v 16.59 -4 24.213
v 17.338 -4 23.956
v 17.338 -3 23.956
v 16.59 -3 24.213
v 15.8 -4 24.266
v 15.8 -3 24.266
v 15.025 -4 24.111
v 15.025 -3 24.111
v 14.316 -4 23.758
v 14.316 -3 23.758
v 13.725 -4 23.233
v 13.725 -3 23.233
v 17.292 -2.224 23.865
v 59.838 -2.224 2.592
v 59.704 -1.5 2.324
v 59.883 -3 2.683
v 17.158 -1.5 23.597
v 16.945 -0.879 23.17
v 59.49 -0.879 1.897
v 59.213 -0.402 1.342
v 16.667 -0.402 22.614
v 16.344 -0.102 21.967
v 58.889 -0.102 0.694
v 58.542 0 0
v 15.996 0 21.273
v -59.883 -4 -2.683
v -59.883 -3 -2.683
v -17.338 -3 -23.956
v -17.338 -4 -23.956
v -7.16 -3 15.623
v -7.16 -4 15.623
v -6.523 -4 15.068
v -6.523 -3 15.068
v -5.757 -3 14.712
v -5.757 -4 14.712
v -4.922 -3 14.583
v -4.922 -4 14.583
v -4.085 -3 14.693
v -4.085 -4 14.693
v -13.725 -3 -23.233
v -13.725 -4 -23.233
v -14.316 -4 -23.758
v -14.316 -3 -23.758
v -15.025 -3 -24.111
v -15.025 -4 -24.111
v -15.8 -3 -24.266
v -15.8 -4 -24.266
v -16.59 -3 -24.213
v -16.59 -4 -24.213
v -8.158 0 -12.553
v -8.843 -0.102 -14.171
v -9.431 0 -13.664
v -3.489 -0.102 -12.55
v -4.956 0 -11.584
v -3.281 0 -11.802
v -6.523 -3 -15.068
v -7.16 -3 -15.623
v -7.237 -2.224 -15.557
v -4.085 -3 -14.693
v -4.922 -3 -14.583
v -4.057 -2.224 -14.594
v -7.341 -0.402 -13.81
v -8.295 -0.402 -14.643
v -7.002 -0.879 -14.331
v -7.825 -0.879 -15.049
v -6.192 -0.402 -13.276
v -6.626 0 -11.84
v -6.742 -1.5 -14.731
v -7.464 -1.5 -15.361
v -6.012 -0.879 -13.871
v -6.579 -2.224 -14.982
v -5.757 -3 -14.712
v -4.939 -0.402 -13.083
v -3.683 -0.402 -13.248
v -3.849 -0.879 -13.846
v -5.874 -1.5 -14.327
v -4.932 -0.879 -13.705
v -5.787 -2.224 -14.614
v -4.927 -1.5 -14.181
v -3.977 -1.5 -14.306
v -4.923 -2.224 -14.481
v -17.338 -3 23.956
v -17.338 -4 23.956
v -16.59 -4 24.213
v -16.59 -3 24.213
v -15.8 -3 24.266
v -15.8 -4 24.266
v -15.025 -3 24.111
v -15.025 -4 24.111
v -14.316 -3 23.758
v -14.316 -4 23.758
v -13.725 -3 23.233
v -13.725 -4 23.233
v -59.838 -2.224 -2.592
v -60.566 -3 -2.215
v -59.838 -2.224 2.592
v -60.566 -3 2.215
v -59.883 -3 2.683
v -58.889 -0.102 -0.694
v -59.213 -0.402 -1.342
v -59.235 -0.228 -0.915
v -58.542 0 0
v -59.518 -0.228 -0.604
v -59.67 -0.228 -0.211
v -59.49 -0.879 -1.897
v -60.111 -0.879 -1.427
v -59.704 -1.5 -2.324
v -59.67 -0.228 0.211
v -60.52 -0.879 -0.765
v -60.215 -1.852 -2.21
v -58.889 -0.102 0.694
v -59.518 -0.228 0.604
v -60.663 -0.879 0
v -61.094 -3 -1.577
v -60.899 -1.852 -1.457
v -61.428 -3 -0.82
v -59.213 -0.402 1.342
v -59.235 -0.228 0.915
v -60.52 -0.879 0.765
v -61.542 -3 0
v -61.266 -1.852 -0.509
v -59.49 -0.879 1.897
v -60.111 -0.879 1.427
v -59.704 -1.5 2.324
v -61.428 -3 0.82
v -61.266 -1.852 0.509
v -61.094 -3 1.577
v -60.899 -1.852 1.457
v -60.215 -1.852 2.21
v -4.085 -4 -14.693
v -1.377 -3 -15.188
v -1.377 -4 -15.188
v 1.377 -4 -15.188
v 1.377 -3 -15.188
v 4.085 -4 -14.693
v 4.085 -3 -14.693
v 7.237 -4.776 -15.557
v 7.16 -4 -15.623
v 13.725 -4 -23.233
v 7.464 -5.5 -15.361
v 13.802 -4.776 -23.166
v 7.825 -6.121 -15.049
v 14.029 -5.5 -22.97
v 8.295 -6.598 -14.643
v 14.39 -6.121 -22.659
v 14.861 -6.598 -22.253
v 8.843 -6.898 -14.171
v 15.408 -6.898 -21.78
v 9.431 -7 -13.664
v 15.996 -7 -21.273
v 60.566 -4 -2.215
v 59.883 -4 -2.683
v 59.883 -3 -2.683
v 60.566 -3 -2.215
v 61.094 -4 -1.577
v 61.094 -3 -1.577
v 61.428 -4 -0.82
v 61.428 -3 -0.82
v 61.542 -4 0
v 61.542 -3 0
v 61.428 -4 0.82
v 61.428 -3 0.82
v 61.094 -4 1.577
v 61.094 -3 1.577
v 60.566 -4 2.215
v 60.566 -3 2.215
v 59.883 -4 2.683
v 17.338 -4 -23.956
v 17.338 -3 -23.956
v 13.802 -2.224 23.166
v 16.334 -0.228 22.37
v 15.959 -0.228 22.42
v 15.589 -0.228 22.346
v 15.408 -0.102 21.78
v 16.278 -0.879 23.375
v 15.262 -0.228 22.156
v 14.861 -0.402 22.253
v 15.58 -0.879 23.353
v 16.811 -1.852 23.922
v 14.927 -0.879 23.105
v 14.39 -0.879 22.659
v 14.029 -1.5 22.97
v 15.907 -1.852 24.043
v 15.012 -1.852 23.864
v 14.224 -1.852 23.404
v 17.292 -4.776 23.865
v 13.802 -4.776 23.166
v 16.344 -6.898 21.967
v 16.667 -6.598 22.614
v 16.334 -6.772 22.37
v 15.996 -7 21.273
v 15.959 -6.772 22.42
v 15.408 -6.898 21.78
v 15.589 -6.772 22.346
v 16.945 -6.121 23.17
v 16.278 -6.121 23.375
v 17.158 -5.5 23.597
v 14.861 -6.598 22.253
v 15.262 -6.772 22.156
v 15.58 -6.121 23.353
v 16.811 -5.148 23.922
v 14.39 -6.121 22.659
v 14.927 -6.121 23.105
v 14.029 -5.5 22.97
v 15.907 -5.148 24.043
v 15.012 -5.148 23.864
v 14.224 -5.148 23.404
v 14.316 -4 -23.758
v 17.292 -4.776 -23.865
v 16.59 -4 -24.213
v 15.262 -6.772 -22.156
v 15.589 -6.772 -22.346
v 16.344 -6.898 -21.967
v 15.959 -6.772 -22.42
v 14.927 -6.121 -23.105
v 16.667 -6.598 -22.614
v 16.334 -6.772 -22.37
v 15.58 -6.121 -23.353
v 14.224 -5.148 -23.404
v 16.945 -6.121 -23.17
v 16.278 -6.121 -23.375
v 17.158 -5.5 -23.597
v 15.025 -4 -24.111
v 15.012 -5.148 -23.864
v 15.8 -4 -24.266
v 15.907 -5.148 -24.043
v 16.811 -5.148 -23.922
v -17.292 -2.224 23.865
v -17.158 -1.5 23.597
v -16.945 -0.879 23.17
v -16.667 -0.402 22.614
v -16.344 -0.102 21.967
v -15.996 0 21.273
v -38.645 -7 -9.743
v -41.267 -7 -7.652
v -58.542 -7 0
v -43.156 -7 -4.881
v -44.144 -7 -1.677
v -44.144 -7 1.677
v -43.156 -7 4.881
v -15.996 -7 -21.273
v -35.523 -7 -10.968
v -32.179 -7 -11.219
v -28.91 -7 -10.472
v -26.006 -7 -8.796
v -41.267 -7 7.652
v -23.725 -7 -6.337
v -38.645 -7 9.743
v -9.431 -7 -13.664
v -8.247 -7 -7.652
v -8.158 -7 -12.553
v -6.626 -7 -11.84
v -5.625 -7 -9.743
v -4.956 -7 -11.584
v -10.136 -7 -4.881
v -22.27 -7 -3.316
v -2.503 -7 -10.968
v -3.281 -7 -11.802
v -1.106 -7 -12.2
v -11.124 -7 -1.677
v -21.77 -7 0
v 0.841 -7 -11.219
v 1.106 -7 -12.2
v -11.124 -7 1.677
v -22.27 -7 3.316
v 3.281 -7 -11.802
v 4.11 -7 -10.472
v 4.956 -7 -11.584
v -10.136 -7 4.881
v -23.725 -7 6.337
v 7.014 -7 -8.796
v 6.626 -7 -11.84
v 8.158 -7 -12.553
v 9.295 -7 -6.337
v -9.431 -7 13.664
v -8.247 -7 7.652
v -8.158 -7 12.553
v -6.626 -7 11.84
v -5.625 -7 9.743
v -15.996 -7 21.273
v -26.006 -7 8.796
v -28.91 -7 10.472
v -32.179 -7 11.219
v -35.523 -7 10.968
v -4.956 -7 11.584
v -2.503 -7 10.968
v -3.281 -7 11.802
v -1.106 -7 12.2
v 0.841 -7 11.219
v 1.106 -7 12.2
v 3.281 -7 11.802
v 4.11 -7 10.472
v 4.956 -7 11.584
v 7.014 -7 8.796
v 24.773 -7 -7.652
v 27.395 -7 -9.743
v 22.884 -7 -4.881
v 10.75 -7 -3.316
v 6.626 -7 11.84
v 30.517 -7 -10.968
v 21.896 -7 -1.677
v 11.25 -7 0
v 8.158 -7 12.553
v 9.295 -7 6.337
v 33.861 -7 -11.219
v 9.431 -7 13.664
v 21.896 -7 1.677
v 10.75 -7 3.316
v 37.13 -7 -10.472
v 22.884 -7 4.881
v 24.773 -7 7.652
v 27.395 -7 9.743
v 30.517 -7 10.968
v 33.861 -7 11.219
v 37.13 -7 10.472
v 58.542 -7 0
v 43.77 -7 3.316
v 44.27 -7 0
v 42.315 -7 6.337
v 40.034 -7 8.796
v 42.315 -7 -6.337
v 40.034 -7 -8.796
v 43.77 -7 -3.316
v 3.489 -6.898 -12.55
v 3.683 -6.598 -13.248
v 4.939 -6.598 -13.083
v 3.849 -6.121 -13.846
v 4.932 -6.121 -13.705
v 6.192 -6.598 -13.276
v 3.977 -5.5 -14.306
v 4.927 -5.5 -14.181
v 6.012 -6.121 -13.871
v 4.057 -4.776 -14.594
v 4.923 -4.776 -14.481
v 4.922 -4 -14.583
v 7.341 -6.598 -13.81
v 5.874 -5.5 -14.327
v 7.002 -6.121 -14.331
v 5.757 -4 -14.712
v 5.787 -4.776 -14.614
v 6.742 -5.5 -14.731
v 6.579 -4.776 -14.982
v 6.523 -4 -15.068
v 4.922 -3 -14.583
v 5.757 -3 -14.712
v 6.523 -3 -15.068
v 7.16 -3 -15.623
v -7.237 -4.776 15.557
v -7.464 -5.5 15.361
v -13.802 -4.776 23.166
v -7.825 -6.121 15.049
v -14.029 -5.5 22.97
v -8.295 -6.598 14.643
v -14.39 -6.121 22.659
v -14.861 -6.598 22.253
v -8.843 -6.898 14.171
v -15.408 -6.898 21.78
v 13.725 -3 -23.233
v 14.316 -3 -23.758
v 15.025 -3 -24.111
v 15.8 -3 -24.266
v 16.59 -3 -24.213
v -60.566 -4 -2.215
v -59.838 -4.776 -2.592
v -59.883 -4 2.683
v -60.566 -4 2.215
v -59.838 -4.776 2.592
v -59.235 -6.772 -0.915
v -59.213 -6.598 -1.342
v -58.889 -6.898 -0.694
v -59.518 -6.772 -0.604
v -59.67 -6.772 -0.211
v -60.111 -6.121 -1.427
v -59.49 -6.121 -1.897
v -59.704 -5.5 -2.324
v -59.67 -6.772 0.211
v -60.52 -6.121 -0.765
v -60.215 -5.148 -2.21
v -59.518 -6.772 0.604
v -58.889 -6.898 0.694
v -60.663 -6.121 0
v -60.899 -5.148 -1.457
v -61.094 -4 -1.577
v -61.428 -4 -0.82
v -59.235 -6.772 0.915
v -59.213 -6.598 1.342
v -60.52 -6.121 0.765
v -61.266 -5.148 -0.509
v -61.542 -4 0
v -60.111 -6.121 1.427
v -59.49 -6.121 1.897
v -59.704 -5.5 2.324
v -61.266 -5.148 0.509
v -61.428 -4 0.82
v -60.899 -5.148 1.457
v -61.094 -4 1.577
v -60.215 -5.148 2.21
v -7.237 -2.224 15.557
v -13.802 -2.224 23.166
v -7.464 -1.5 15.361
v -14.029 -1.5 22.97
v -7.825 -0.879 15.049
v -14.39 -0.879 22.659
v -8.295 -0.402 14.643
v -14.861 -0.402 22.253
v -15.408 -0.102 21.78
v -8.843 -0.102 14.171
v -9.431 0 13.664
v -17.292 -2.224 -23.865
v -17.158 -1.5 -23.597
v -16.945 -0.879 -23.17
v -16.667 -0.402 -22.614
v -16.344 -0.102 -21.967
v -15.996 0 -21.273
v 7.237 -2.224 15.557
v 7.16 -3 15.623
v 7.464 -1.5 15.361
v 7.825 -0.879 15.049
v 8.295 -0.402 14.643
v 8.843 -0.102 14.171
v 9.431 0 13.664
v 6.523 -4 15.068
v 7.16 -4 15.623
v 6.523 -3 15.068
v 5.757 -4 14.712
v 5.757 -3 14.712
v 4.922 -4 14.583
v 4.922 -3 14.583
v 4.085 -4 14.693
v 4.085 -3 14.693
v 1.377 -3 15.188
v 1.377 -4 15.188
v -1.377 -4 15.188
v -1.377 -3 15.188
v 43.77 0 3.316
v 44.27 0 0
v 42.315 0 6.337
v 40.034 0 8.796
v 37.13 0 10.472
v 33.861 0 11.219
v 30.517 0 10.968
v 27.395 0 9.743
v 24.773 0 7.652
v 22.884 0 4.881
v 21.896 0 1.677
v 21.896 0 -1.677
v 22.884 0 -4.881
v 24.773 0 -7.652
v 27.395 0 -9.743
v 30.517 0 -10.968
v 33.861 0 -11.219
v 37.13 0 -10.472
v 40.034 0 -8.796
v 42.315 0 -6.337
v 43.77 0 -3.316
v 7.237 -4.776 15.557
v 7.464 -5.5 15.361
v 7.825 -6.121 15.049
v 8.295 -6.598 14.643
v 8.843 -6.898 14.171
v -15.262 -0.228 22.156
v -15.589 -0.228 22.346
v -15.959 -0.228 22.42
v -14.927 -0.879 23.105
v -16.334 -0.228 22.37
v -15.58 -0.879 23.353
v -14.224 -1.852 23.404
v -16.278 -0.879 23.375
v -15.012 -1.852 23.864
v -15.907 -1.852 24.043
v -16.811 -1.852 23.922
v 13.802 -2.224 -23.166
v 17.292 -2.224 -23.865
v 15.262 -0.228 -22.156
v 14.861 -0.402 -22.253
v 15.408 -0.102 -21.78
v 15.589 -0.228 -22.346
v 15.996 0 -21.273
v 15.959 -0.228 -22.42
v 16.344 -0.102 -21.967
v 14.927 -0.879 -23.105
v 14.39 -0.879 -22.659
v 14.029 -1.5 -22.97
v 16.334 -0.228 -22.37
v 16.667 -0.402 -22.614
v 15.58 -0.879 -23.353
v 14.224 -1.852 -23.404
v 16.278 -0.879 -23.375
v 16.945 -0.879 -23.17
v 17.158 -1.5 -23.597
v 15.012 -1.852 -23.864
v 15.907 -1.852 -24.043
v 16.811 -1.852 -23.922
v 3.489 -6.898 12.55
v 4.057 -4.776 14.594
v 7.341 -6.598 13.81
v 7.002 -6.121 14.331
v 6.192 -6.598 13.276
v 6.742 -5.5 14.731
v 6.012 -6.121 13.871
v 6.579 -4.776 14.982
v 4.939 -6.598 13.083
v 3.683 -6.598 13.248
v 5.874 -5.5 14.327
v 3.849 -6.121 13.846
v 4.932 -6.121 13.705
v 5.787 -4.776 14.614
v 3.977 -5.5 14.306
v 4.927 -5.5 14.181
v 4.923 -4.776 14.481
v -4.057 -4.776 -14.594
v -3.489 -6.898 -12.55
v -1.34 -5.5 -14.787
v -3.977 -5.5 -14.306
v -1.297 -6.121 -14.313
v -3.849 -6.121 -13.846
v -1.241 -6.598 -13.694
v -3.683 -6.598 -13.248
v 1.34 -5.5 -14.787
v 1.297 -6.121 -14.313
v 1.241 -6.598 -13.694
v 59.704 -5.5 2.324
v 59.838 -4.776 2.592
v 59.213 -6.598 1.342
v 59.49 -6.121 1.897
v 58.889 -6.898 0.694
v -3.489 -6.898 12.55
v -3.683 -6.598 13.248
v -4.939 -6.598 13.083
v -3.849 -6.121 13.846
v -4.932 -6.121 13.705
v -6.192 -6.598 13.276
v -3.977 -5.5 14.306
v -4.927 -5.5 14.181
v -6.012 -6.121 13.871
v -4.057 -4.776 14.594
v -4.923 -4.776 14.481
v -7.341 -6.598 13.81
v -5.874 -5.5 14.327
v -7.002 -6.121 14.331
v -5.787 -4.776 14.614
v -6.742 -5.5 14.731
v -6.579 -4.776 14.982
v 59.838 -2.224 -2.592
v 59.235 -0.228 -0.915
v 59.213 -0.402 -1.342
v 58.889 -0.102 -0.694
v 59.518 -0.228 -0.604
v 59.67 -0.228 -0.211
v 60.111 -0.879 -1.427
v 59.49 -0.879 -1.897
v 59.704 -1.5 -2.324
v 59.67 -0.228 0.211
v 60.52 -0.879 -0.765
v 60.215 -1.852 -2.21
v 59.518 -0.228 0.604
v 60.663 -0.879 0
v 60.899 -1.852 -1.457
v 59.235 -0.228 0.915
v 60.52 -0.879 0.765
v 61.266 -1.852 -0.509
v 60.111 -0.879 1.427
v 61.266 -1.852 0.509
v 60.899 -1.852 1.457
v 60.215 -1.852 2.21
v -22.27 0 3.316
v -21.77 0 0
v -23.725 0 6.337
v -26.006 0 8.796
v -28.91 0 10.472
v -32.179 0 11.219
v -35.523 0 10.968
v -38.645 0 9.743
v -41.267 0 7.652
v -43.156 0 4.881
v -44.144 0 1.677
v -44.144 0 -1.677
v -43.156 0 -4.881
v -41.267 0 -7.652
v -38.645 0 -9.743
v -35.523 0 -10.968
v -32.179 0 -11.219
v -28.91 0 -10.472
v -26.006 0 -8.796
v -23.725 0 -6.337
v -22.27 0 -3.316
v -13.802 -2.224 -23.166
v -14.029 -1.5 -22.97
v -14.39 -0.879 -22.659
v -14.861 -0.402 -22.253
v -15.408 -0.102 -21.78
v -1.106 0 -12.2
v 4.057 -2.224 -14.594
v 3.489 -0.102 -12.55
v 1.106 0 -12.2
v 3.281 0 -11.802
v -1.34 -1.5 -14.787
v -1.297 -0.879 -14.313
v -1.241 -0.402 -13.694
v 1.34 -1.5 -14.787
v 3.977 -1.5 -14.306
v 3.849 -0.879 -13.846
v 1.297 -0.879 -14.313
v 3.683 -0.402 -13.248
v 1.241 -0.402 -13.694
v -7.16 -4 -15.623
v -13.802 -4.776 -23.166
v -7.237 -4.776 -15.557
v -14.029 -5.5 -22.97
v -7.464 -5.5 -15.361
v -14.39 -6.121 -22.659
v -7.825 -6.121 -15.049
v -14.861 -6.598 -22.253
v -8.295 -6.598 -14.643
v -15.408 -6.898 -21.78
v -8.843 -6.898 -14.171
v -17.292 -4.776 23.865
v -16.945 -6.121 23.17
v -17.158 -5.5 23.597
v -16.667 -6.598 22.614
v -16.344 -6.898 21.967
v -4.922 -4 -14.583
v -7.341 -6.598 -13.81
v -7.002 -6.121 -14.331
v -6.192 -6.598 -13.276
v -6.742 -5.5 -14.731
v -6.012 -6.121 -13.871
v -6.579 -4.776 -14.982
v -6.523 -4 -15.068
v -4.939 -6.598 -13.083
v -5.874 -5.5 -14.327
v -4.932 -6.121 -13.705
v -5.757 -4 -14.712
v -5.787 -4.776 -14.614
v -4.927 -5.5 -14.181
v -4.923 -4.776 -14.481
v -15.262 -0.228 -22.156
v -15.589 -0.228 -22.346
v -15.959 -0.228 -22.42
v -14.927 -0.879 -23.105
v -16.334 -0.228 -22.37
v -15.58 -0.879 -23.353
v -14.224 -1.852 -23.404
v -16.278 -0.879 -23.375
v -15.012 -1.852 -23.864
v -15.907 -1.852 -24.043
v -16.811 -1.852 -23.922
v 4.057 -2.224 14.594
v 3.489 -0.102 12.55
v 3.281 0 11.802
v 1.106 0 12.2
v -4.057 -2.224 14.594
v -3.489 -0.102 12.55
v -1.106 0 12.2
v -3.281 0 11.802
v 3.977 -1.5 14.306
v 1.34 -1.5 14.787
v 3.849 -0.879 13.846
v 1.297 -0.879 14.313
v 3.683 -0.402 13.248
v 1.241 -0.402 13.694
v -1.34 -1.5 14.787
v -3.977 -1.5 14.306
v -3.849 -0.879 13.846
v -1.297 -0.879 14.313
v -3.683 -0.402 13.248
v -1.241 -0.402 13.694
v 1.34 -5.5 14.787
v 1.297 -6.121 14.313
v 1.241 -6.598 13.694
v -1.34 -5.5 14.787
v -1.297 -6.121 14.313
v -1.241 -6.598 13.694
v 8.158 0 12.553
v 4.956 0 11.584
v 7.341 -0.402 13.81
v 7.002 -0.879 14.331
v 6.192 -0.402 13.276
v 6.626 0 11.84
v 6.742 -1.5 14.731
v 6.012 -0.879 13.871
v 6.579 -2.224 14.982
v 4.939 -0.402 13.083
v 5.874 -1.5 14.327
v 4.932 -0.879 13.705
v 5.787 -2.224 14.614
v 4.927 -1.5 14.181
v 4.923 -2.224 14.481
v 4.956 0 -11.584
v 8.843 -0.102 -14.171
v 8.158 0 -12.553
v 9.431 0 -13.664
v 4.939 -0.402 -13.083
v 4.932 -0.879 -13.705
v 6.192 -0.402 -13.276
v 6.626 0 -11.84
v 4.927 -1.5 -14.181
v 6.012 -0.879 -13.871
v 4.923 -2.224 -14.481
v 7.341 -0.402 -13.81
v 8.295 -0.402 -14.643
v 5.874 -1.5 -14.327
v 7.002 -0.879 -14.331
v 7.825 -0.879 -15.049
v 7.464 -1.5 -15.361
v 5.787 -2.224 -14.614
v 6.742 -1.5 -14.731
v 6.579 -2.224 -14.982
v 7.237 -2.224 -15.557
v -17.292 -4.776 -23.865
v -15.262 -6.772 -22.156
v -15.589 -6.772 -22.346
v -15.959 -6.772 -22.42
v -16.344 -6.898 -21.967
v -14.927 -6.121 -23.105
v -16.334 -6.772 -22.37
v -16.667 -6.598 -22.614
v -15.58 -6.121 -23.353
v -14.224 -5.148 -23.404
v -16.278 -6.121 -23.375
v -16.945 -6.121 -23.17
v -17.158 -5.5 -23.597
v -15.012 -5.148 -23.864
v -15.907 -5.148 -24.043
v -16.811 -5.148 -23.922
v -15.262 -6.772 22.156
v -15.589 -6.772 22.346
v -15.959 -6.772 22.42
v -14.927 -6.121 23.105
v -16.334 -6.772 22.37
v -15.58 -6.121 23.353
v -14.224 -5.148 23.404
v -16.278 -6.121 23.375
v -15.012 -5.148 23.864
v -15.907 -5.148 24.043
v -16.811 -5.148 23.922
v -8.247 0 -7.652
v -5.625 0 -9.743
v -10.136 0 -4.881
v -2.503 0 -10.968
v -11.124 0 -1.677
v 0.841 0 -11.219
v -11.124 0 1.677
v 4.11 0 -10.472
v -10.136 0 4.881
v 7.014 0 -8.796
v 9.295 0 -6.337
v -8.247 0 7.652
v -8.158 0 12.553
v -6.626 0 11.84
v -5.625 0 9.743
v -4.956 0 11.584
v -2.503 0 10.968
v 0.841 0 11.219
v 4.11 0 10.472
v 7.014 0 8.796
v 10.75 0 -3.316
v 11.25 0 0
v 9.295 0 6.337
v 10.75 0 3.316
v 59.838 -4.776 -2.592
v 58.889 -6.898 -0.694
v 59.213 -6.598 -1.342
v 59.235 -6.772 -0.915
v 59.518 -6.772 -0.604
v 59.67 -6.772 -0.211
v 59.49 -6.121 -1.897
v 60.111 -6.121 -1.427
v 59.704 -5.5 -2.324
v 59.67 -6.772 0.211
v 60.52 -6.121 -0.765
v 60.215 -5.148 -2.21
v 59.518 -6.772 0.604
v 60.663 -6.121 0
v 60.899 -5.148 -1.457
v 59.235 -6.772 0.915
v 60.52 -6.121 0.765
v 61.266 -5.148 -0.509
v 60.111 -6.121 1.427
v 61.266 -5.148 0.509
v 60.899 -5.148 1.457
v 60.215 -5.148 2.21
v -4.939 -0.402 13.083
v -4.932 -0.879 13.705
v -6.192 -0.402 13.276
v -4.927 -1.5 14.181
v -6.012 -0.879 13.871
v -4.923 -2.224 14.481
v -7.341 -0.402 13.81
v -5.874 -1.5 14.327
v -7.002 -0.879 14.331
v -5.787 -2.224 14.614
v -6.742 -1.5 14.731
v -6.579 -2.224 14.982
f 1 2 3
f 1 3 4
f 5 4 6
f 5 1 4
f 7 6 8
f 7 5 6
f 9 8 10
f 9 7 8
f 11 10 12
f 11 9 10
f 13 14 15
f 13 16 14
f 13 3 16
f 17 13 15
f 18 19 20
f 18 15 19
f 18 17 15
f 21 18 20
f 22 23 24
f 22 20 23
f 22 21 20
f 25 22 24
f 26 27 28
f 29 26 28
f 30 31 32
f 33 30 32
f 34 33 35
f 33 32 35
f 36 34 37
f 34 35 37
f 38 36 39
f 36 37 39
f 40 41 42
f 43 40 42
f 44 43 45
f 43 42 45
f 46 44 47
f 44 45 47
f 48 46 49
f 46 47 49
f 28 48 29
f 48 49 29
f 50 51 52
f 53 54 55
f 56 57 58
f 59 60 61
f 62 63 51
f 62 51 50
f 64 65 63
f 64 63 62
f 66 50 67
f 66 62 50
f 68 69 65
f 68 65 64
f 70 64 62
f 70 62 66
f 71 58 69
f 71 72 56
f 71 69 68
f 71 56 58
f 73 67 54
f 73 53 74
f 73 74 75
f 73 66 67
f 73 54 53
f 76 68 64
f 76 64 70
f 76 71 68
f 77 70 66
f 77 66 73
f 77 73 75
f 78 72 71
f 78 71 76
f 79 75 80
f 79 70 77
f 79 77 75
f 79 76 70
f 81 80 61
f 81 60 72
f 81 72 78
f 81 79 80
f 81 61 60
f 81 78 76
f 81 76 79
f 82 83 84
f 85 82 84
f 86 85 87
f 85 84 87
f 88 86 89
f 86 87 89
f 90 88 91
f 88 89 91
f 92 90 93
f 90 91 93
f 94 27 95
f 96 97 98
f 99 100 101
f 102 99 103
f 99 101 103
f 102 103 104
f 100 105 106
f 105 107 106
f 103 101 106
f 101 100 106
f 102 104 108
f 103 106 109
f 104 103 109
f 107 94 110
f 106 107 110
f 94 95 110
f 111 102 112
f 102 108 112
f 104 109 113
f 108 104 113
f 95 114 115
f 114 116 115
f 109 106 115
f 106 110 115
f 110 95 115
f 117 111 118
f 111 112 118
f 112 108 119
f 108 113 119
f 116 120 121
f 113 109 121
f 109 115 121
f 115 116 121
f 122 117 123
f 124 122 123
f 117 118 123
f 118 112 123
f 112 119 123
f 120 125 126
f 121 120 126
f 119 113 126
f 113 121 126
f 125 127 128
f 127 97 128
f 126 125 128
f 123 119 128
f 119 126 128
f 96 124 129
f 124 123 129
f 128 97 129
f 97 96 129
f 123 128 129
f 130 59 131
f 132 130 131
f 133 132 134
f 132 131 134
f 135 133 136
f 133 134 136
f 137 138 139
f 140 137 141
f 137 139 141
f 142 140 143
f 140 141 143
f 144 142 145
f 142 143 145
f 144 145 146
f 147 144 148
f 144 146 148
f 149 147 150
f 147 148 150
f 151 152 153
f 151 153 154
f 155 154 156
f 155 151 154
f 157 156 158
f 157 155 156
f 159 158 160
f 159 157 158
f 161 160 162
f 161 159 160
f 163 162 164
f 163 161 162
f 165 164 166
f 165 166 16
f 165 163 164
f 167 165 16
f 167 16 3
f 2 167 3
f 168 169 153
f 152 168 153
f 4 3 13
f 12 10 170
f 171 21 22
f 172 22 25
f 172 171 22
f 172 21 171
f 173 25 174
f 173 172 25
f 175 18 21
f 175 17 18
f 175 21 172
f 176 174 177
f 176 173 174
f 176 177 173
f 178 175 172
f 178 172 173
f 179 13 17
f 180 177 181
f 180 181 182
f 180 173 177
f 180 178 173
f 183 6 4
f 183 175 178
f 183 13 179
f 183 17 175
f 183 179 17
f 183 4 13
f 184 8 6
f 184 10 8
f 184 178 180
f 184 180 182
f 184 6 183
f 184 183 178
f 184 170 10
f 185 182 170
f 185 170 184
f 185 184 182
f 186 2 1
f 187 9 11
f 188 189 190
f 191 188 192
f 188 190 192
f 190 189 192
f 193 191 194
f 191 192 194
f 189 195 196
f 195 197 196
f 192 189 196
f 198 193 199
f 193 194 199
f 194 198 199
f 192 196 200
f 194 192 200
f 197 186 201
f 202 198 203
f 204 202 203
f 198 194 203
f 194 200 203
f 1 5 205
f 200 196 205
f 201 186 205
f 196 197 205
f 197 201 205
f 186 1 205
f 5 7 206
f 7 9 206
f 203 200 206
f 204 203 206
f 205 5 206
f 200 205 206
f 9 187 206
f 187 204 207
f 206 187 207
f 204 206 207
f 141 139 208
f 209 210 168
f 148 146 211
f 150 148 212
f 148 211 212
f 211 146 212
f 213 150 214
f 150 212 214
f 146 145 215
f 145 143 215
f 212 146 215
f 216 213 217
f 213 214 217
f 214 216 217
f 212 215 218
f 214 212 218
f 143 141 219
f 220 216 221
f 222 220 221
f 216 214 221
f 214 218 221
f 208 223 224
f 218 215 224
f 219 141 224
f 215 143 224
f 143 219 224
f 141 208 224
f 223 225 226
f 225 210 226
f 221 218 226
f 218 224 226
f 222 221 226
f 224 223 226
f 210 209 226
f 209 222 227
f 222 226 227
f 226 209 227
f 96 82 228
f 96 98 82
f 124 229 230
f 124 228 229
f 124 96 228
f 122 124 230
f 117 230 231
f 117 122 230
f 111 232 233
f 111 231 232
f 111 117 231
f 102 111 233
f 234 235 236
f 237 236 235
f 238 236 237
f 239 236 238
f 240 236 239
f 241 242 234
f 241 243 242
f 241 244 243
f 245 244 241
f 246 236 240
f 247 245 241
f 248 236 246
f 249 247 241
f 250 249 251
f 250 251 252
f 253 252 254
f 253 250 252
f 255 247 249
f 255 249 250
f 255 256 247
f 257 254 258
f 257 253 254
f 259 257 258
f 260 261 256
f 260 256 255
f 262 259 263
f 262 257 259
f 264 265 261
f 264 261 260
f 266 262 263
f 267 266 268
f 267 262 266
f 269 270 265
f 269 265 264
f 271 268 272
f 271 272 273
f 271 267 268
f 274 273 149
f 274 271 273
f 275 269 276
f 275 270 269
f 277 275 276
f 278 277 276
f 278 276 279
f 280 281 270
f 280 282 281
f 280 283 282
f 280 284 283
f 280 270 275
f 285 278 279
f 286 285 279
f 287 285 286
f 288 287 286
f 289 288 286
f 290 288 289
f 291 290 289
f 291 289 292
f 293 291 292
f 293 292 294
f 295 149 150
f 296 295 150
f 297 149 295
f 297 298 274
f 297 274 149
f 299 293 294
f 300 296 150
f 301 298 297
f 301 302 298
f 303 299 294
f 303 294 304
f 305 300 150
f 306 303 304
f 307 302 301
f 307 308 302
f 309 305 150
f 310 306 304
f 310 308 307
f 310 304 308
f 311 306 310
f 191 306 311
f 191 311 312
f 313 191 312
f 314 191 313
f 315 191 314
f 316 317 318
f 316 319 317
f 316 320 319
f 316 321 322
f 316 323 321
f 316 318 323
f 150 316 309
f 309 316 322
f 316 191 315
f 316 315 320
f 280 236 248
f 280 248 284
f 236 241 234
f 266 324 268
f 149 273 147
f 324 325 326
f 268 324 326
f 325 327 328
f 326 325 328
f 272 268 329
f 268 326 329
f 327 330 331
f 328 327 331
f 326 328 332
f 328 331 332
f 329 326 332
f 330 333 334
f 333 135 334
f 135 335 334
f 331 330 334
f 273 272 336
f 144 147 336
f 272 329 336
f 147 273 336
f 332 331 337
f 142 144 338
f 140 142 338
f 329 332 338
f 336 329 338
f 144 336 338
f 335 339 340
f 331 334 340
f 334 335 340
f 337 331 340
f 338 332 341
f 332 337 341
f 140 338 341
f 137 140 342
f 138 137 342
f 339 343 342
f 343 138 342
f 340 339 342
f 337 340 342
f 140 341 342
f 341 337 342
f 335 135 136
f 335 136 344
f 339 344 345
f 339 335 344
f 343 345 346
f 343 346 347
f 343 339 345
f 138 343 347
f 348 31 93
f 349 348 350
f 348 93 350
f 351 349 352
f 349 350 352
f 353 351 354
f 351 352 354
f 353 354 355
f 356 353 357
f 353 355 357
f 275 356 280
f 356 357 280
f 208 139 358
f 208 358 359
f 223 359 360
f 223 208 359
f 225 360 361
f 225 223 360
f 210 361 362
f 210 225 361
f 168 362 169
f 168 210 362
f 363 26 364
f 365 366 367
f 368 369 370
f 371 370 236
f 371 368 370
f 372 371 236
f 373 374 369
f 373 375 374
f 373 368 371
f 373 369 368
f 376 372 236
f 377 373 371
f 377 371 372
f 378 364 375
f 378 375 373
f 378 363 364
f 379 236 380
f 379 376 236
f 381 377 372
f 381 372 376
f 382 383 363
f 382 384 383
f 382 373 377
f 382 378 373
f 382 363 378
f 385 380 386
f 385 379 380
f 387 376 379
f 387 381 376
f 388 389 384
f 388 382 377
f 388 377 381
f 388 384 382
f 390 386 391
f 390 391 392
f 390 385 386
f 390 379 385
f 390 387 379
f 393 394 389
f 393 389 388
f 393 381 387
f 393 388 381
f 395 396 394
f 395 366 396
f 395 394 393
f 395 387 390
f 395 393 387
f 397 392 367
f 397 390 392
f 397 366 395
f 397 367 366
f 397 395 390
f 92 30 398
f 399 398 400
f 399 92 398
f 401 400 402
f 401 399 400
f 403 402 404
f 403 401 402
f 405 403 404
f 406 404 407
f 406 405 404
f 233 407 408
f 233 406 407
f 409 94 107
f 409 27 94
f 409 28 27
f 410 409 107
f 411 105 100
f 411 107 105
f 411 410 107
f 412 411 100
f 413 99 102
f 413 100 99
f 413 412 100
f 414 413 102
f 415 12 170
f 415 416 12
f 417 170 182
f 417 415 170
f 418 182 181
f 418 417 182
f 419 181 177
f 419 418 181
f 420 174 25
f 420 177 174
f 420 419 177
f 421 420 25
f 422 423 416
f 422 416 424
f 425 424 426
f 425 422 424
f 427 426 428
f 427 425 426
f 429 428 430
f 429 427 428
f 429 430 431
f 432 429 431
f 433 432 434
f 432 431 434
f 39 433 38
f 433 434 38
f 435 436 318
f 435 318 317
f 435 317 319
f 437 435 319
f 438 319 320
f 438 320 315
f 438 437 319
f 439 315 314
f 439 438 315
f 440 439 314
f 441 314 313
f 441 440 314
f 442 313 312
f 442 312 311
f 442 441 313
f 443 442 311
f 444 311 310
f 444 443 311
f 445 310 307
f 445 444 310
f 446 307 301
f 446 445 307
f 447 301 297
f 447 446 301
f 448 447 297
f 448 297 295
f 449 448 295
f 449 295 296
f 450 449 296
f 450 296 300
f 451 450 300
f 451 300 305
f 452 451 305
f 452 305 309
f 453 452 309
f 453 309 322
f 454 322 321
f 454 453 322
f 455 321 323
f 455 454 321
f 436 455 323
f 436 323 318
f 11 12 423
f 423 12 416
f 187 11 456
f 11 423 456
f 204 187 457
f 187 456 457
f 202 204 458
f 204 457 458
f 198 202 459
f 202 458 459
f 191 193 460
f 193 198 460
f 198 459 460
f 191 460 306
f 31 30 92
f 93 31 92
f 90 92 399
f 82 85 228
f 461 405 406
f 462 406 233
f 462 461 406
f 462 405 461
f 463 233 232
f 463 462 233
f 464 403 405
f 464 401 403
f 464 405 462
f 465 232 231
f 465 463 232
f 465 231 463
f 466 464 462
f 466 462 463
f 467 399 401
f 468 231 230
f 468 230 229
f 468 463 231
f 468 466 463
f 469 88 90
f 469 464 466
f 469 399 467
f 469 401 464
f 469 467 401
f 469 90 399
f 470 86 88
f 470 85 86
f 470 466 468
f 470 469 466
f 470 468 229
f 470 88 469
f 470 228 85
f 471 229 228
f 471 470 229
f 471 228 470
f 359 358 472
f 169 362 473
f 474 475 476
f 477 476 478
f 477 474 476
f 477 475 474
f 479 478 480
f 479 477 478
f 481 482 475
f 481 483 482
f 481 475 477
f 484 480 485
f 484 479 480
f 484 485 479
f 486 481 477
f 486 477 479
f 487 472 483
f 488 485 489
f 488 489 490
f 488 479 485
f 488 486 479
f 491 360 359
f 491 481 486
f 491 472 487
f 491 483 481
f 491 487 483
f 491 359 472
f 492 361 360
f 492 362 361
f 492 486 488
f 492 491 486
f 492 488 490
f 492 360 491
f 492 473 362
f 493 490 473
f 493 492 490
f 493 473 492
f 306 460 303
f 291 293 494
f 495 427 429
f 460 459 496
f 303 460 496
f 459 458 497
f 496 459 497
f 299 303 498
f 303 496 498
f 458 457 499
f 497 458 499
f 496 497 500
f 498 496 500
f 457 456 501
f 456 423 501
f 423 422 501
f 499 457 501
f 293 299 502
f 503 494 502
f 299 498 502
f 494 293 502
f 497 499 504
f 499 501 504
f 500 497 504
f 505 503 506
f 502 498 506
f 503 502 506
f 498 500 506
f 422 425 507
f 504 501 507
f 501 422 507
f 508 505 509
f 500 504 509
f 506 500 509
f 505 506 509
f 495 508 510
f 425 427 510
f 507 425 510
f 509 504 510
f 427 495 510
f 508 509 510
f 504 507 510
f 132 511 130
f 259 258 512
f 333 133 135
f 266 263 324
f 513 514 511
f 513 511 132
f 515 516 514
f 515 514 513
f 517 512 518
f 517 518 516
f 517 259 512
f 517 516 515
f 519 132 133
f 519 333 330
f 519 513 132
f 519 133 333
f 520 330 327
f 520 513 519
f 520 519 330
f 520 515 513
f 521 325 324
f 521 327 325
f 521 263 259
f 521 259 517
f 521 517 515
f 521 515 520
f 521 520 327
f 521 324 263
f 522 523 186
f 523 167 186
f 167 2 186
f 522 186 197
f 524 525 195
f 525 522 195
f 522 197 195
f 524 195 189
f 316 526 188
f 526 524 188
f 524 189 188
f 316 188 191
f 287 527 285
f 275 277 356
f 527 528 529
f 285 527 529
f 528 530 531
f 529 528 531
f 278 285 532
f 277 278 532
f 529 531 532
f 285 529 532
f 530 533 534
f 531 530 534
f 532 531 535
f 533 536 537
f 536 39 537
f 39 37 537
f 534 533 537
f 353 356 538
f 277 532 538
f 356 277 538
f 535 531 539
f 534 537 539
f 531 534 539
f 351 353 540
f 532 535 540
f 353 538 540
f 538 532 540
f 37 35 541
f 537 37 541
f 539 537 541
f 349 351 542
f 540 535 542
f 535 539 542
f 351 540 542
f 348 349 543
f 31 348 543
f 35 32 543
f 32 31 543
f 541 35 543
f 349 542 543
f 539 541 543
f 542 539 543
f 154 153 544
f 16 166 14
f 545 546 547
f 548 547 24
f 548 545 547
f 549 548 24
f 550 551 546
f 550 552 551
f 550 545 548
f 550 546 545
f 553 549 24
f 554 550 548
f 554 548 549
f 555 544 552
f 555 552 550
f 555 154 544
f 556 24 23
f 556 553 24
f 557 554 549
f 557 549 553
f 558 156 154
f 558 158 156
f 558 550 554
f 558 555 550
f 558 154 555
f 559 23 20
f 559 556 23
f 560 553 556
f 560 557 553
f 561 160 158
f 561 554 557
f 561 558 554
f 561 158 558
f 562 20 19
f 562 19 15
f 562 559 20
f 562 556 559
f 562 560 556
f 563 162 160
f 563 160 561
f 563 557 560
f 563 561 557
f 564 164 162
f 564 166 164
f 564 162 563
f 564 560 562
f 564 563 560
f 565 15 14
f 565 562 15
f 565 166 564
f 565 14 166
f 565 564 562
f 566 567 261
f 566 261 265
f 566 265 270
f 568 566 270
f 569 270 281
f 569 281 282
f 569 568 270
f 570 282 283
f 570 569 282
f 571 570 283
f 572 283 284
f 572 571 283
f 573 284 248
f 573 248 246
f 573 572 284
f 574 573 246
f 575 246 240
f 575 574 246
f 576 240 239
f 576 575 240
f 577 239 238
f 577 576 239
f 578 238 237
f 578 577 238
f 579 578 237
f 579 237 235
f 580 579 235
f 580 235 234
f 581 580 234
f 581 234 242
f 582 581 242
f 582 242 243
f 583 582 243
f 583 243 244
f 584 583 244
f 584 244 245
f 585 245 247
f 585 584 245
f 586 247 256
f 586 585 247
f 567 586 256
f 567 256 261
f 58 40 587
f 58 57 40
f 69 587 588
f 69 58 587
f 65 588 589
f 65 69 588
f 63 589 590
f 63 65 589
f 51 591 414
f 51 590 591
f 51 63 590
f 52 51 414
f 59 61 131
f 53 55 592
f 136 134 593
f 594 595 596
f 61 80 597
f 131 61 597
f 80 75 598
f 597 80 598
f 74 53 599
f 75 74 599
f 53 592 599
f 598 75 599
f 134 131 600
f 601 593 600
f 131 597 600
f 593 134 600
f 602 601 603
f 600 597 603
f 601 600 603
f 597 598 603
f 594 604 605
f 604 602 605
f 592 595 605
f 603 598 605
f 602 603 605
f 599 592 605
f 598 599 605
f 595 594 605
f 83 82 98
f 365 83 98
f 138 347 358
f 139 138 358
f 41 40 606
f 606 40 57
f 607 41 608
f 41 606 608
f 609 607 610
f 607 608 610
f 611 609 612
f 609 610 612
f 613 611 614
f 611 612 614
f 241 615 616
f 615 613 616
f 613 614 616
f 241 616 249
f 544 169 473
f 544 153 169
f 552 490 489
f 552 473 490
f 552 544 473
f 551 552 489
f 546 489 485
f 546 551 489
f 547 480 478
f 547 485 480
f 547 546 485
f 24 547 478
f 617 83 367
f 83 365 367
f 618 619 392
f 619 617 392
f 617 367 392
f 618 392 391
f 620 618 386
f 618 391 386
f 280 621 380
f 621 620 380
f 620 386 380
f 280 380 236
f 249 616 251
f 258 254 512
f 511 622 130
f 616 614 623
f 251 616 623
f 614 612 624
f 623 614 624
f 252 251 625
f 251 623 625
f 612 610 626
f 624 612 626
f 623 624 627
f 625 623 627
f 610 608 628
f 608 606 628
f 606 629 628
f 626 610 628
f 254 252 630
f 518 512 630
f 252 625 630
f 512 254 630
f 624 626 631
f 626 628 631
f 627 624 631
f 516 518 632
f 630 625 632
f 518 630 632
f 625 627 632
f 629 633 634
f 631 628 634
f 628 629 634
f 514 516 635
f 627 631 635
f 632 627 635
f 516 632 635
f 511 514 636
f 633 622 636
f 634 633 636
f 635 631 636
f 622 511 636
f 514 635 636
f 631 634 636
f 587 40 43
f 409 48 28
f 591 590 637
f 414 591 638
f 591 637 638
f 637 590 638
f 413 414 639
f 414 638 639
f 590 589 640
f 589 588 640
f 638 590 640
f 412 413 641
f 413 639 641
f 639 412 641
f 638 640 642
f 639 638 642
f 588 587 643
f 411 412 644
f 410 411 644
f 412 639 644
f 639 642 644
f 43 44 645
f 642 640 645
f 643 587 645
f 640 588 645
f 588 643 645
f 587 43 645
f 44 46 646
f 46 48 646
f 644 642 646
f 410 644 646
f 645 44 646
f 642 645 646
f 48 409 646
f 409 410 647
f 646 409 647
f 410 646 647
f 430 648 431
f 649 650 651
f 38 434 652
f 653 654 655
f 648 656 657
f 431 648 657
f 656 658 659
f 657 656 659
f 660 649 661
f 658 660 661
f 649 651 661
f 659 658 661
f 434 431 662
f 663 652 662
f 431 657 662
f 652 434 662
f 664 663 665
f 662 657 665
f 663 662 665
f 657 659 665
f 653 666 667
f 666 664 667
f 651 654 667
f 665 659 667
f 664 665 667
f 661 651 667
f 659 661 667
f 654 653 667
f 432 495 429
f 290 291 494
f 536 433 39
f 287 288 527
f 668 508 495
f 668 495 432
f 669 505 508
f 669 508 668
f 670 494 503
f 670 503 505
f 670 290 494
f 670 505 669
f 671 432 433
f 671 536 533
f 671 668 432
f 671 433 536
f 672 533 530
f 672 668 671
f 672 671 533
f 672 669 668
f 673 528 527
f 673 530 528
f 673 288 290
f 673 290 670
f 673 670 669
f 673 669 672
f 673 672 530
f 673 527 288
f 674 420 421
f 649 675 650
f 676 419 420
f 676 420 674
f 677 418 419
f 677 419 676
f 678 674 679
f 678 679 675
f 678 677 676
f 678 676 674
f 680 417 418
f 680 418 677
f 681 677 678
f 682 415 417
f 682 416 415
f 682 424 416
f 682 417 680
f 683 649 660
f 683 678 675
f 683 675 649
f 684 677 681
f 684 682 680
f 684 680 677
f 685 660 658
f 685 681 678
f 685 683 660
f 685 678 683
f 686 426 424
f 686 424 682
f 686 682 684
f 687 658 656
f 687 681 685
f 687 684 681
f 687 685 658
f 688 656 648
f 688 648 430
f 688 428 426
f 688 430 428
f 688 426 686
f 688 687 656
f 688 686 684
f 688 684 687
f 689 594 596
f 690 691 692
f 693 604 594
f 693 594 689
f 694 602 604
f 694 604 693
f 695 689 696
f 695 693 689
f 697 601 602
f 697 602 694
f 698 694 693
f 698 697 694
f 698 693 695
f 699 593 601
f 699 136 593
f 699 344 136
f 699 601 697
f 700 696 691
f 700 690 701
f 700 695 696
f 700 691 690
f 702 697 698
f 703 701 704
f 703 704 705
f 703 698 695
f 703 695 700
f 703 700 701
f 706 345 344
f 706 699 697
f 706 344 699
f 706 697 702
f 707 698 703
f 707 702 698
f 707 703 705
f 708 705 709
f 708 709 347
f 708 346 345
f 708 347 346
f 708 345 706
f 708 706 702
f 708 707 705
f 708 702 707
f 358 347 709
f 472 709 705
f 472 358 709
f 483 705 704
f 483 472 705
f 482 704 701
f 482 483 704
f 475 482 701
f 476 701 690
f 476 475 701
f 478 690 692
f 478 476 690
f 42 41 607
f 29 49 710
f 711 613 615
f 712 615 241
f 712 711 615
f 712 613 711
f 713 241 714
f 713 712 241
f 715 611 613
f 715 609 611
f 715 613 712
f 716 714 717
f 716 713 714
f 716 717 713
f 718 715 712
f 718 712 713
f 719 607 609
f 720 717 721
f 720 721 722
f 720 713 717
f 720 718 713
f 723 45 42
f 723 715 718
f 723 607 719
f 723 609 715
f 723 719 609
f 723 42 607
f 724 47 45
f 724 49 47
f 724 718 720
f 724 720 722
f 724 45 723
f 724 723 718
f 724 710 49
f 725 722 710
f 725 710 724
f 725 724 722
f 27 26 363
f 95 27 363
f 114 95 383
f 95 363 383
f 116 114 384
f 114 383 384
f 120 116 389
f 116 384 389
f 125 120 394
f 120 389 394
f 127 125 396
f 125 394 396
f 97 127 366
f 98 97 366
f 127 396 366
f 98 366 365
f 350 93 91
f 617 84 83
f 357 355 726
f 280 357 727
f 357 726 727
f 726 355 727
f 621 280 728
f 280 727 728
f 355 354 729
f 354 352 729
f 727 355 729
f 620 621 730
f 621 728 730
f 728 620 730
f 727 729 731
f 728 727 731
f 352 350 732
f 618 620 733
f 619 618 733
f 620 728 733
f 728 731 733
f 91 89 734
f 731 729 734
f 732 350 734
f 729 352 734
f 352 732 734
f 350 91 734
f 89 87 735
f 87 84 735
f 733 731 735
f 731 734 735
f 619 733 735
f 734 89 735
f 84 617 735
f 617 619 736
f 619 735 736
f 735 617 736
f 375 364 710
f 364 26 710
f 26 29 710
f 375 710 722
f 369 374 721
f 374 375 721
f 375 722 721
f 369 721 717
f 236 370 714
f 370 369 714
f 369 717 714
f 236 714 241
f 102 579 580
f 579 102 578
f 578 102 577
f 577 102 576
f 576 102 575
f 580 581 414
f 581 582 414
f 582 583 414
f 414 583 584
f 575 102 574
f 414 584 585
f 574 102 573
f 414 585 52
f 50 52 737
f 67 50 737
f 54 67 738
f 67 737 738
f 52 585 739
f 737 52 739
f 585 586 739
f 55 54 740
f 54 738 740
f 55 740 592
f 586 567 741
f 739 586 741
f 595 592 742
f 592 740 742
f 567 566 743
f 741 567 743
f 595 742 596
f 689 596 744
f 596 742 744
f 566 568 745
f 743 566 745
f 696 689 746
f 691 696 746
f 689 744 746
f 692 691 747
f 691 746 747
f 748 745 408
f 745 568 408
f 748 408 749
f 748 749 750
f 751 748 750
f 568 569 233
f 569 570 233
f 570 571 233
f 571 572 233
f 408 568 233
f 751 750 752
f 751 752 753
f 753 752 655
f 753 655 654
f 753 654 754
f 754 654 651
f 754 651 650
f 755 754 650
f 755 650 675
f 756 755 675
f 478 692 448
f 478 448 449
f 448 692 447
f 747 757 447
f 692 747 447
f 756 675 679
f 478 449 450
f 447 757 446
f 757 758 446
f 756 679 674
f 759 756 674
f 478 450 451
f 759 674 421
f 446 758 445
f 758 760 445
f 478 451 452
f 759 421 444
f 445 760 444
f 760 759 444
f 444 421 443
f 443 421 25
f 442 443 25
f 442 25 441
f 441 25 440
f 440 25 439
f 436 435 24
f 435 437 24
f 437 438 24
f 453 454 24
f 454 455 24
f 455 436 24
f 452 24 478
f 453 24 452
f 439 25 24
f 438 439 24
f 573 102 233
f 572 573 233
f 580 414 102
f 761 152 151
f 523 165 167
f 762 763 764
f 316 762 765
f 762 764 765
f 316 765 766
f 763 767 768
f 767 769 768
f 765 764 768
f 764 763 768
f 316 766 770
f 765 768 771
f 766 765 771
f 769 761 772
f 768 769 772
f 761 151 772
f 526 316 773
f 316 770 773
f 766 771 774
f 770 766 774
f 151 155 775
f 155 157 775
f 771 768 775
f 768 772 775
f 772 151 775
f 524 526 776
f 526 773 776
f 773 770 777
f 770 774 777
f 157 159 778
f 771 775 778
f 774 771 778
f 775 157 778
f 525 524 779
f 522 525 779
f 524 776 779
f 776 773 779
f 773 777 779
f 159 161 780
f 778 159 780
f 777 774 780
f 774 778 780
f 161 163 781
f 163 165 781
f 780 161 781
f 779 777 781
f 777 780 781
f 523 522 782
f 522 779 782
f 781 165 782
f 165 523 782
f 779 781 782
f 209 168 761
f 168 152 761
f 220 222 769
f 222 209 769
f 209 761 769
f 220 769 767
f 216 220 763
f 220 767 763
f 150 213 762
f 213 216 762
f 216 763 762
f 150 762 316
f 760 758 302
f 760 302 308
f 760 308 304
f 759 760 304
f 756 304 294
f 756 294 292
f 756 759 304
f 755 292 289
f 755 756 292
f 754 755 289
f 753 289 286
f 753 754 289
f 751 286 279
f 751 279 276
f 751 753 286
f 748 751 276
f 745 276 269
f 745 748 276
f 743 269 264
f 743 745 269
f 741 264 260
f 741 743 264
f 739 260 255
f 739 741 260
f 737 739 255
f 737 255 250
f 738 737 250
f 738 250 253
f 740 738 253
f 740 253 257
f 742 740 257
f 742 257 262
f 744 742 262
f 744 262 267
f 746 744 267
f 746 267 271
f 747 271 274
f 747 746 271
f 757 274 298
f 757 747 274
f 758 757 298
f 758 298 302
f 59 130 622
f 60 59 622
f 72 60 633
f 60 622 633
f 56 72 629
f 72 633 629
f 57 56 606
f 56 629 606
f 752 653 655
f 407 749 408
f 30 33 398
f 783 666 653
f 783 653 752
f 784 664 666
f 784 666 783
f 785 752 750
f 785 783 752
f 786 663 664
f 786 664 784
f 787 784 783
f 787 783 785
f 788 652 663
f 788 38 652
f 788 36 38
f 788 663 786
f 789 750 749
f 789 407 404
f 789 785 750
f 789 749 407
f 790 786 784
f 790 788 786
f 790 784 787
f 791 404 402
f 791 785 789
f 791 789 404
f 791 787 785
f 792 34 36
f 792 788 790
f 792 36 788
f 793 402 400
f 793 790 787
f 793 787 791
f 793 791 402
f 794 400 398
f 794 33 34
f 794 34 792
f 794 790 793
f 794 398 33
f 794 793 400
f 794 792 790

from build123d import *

# Parameters (mm, degrees)
F0_R     = 11.25
F1_DEPTH = 7
F2_R     = 3


with BuildPart() as f1:
    # F0 (on Front) → F1 (new body)
    with BuildSketch(Plane.XZ):
        with BuildLine():
            ThreePointArc((5.8359223436, -14.0891628708), (12.6799115876, -8.4724460535), (15.25, 0))
            ThreePointArc((15.25, 0), (12.6799115876, 8.4724460535), (5.8359223436, 14.0891628708))
            ThreePointArc((5.8359223436, 14.0891628708), (0, 15.25), (-5.8359223436, 14.0891628708))
            ThreePointArc((-5.8359223436, 14.0891628708), (-12.6799115876, 8.4724460535), (-15.25, 0))
            ThreePointArc((-15.25, 0), (-12.6799115876, -8.4724460535), (-5.8359223436, -14.0891628708))
            ThreePointArc((-5.8359223436, -14.0891628708), (0, -15.25), (5.8359223436, -14.0891628708))
        make_face()
        Circle(F0_R, mode=Mode.SUBTRACT)
        with BuildLine():
            Line((15.25, -25), (15.25, 0))
            ThreePointArc((15.25, 0), (12.6799115876, -8.4724460535), (5.8359223436, -14.0891628708))
            Line((5.8359223436, -14.0891628708), (15.25, -25))
        make_face()
        with BuildLine():
            ThreePointArc((5.8359223436, 14.0891628708), (12.6799115876, 8.4724460535), (15.25, 0))
            Line((15.25, 0), (15.25, 25))
            Line((15.25, 25), (5.8359223436, 14.0891628708))
        make_face()
        Polygon((15.25, 25), (15.25, 0), (15.25, -25), (65.25, 0), align=None)
        with Locations((33.02, 0)):
            Circle(F0_R, mode=Mode.SUBTRACT)
        with BuildLine():
            ThreePointArc((-15.25, 0), (-12.6799115876, 8.4724460535), (-5.8359223436, 14.0891628708))
            Line((-5.8359223436, 14.0891628708), (-15.25, 25))
            Line((-15.25, 25), (-15.25, 0))
        make_face()
        with BuildLine():
            Line((-15.25, -25), (-5.8359223436, -14.0891628708))
            ThreePointArc((-5.8359223436, -14.0891628708), (-12.6799115876, -8.4724460535), (-15.25, 0))
            Line((-15.25, 0), (-15.25, -25))
        make_face()
        Polygon((-15.25, -25), (-15.25, 0), (-15.25, 25), (-65.25, 0), align=None)
        with Locations((-33.02, 0)):
            Circle(F0_R, mode=Mode.SUBTRACT)
    extrude(amount=F1_DEPTH)

    # F2
    f2_edges = [f1.edges().sort_by_distance(p)[0] for p in [
        (-15.25, -3.5, -25),
        (-5.835922, -3.5, -14.089163),
        (-10.542961, 0, -19.544581),
        (-10.542961, -7, -19.544581),
        (5.835922, -3.5, -14.089163),
        (0, 0, -15.25),
        (0, -7, -15.25),
        (15.25, -3.5, -25),
        (10.542961, 0, -19.544581),
        (10.542961, -7, -19.544581),
        (-65.25, -3.5, 0),
        (-40.25, 0, -12.5),
        (-40.25, -7, -12.5),
        (65.25, -3.5, 0),
        (40.25, 0, -12.5),
        (40.25, -7, -12.5),
        (15.25, -3.5, 25),
        (40.25, 0, 12.5),
        (40.25, -7, 12.5),
        (5.835922, -3.5, 14.089163),
        (10.542961, 0, 19.544581),
        (10.542961, -7, 19.544581),
        (-5.835922, -3.5, 14.089163),
        (0, 0, 15.25),
        (0, -7, 15.25),
        (-15.25, -3.5, 25),
        (-10.542961, 0, 19.544581),
        (-10.542961, -7, 19.544581),
        (-40.25, 0, 12.5),
        (-40.25, -7, 12.5),
    ]]
    fillet(f2_edges, radius=F2_R)


solid = f1.part
